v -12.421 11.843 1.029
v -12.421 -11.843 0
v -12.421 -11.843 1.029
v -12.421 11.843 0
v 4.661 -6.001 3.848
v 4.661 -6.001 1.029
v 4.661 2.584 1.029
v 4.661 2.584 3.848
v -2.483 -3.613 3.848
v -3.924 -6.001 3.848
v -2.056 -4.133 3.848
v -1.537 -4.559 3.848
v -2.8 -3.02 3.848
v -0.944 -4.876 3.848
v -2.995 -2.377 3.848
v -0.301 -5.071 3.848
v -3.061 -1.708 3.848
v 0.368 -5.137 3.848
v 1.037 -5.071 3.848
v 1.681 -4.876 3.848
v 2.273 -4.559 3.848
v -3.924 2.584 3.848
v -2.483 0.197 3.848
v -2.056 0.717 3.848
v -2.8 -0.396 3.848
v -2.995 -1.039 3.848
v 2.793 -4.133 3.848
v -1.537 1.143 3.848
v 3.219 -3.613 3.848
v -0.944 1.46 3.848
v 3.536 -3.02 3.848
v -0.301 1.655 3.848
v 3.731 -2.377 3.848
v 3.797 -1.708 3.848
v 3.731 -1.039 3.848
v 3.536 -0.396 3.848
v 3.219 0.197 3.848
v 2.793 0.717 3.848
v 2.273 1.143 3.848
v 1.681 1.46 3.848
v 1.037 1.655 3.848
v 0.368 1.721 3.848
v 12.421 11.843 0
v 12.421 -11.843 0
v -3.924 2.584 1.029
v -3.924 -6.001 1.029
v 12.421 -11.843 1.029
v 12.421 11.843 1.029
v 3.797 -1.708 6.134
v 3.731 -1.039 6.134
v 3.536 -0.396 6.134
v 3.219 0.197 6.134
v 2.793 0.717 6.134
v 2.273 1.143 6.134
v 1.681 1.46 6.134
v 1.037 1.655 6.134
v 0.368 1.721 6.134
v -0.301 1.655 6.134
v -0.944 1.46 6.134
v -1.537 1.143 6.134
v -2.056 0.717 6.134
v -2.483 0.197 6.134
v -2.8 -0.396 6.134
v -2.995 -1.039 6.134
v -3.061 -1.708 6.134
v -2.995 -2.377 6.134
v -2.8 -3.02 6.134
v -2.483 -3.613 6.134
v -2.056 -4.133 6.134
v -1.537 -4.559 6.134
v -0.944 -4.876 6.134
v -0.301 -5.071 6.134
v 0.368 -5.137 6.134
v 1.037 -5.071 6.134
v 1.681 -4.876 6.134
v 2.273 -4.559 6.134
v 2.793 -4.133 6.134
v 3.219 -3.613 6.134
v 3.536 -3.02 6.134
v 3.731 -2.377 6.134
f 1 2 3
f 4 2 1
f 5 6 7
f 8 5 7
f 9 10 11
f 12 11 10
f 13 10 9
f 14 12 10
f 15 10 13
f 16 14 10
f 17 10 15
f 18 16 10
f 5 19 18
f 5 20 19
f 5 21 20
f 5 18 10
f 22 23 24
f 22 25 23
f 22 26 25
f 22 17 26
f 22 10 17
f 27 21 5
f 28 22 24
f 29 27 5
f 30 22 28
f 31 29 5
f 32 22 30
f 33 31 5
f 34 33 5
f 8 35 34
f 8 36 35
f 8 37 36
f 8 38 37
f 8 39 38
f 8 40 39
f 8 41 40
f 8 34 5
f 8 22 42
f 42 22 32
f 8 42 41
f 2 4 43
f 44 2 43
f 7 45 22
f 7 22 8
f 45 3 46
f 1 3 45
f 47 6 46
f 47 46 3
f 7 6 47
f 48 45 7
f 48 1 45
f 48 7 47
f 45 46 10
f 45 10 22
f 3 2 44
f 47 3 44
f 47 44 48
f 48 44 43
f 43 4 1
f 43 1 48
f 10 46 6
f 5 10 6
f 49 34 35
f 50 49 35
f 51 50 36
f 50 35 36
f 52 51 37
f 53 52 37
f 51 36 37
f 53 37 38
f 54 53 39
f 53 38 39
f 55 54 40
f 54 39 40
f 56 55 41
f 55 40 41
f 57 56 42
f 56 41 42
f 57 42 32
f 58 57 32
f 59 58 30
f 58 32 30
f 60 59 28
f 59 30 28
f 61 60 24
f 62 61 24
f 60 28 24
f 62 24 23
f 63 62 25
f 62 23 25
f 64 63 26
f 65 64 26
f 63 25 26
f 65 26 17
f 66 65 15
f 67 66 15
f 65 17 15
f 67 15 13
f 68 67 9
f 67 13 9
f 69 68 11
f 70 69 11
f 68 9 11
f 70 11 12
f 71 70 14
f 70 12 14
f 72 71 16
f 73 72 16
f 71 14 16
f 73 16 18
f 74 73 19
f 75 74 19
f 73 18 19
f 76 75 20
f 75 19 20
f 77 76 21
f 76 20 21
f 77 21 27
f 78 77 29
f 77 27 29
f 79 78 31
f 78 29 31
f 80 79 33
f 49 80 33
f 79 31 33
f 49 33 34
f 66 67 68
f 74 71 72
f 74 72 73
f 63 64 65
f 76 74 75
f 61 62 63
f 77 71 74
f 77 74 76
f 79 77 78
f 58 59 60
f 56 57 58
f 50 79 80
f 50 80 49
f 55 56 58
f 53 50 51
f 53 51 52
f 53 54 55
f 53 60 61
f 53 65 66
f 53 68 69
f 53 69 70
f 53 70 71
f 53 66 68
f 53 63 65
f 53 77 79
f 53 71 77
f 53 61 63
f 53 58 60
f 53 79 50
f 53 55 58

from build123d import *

# Parameters (mm, degrees)
SKETCH1_W           = 24.8412
SKETCH1_H           = 23.6855
BOSS_EXTRUDE1_DEPTH = 1.0287
SKETCH2_W           = 8.5852
SKETCH2_H           = 8.5852
BOSS_EXTRUDE2_DEPTH = 2.8194
SKETCH3_R           = 3.429
BOSS_EXTRUDE3_DEPTH = 2.286


with BuildPart() as part:
    # Sketch1 → Boss-Extrude1 (new body)
    with BuildSketch(Plane.XY):
        Rectangle(SKETCH1_W, SKETCH1_H)
    extrude(amount=BOSS_EXTRUDE1_DEPTH)

    # Sketch2 → Boss-Extrude2 (add)
    with BuildSketch(Plane.XY.offset(1.0287)):
        with Locations((0.3683, -1.70815)):
            Rectangle(SKETCH2_W, SKETCH2_H)
    extrude(amount=BOSS_EXTRUDE2_DEPTH)

    # Sketch3 → Boss-Extrude3 (add)
    with BuildSketch(Plane.XY.offset(3.8481)):
        with Locations((0.3683, -1.70815)):
            Circle(SKETCH3_R)
    extrude(amount=BOSS_EXTRUDE3_DEPTH)


solid = part.part
